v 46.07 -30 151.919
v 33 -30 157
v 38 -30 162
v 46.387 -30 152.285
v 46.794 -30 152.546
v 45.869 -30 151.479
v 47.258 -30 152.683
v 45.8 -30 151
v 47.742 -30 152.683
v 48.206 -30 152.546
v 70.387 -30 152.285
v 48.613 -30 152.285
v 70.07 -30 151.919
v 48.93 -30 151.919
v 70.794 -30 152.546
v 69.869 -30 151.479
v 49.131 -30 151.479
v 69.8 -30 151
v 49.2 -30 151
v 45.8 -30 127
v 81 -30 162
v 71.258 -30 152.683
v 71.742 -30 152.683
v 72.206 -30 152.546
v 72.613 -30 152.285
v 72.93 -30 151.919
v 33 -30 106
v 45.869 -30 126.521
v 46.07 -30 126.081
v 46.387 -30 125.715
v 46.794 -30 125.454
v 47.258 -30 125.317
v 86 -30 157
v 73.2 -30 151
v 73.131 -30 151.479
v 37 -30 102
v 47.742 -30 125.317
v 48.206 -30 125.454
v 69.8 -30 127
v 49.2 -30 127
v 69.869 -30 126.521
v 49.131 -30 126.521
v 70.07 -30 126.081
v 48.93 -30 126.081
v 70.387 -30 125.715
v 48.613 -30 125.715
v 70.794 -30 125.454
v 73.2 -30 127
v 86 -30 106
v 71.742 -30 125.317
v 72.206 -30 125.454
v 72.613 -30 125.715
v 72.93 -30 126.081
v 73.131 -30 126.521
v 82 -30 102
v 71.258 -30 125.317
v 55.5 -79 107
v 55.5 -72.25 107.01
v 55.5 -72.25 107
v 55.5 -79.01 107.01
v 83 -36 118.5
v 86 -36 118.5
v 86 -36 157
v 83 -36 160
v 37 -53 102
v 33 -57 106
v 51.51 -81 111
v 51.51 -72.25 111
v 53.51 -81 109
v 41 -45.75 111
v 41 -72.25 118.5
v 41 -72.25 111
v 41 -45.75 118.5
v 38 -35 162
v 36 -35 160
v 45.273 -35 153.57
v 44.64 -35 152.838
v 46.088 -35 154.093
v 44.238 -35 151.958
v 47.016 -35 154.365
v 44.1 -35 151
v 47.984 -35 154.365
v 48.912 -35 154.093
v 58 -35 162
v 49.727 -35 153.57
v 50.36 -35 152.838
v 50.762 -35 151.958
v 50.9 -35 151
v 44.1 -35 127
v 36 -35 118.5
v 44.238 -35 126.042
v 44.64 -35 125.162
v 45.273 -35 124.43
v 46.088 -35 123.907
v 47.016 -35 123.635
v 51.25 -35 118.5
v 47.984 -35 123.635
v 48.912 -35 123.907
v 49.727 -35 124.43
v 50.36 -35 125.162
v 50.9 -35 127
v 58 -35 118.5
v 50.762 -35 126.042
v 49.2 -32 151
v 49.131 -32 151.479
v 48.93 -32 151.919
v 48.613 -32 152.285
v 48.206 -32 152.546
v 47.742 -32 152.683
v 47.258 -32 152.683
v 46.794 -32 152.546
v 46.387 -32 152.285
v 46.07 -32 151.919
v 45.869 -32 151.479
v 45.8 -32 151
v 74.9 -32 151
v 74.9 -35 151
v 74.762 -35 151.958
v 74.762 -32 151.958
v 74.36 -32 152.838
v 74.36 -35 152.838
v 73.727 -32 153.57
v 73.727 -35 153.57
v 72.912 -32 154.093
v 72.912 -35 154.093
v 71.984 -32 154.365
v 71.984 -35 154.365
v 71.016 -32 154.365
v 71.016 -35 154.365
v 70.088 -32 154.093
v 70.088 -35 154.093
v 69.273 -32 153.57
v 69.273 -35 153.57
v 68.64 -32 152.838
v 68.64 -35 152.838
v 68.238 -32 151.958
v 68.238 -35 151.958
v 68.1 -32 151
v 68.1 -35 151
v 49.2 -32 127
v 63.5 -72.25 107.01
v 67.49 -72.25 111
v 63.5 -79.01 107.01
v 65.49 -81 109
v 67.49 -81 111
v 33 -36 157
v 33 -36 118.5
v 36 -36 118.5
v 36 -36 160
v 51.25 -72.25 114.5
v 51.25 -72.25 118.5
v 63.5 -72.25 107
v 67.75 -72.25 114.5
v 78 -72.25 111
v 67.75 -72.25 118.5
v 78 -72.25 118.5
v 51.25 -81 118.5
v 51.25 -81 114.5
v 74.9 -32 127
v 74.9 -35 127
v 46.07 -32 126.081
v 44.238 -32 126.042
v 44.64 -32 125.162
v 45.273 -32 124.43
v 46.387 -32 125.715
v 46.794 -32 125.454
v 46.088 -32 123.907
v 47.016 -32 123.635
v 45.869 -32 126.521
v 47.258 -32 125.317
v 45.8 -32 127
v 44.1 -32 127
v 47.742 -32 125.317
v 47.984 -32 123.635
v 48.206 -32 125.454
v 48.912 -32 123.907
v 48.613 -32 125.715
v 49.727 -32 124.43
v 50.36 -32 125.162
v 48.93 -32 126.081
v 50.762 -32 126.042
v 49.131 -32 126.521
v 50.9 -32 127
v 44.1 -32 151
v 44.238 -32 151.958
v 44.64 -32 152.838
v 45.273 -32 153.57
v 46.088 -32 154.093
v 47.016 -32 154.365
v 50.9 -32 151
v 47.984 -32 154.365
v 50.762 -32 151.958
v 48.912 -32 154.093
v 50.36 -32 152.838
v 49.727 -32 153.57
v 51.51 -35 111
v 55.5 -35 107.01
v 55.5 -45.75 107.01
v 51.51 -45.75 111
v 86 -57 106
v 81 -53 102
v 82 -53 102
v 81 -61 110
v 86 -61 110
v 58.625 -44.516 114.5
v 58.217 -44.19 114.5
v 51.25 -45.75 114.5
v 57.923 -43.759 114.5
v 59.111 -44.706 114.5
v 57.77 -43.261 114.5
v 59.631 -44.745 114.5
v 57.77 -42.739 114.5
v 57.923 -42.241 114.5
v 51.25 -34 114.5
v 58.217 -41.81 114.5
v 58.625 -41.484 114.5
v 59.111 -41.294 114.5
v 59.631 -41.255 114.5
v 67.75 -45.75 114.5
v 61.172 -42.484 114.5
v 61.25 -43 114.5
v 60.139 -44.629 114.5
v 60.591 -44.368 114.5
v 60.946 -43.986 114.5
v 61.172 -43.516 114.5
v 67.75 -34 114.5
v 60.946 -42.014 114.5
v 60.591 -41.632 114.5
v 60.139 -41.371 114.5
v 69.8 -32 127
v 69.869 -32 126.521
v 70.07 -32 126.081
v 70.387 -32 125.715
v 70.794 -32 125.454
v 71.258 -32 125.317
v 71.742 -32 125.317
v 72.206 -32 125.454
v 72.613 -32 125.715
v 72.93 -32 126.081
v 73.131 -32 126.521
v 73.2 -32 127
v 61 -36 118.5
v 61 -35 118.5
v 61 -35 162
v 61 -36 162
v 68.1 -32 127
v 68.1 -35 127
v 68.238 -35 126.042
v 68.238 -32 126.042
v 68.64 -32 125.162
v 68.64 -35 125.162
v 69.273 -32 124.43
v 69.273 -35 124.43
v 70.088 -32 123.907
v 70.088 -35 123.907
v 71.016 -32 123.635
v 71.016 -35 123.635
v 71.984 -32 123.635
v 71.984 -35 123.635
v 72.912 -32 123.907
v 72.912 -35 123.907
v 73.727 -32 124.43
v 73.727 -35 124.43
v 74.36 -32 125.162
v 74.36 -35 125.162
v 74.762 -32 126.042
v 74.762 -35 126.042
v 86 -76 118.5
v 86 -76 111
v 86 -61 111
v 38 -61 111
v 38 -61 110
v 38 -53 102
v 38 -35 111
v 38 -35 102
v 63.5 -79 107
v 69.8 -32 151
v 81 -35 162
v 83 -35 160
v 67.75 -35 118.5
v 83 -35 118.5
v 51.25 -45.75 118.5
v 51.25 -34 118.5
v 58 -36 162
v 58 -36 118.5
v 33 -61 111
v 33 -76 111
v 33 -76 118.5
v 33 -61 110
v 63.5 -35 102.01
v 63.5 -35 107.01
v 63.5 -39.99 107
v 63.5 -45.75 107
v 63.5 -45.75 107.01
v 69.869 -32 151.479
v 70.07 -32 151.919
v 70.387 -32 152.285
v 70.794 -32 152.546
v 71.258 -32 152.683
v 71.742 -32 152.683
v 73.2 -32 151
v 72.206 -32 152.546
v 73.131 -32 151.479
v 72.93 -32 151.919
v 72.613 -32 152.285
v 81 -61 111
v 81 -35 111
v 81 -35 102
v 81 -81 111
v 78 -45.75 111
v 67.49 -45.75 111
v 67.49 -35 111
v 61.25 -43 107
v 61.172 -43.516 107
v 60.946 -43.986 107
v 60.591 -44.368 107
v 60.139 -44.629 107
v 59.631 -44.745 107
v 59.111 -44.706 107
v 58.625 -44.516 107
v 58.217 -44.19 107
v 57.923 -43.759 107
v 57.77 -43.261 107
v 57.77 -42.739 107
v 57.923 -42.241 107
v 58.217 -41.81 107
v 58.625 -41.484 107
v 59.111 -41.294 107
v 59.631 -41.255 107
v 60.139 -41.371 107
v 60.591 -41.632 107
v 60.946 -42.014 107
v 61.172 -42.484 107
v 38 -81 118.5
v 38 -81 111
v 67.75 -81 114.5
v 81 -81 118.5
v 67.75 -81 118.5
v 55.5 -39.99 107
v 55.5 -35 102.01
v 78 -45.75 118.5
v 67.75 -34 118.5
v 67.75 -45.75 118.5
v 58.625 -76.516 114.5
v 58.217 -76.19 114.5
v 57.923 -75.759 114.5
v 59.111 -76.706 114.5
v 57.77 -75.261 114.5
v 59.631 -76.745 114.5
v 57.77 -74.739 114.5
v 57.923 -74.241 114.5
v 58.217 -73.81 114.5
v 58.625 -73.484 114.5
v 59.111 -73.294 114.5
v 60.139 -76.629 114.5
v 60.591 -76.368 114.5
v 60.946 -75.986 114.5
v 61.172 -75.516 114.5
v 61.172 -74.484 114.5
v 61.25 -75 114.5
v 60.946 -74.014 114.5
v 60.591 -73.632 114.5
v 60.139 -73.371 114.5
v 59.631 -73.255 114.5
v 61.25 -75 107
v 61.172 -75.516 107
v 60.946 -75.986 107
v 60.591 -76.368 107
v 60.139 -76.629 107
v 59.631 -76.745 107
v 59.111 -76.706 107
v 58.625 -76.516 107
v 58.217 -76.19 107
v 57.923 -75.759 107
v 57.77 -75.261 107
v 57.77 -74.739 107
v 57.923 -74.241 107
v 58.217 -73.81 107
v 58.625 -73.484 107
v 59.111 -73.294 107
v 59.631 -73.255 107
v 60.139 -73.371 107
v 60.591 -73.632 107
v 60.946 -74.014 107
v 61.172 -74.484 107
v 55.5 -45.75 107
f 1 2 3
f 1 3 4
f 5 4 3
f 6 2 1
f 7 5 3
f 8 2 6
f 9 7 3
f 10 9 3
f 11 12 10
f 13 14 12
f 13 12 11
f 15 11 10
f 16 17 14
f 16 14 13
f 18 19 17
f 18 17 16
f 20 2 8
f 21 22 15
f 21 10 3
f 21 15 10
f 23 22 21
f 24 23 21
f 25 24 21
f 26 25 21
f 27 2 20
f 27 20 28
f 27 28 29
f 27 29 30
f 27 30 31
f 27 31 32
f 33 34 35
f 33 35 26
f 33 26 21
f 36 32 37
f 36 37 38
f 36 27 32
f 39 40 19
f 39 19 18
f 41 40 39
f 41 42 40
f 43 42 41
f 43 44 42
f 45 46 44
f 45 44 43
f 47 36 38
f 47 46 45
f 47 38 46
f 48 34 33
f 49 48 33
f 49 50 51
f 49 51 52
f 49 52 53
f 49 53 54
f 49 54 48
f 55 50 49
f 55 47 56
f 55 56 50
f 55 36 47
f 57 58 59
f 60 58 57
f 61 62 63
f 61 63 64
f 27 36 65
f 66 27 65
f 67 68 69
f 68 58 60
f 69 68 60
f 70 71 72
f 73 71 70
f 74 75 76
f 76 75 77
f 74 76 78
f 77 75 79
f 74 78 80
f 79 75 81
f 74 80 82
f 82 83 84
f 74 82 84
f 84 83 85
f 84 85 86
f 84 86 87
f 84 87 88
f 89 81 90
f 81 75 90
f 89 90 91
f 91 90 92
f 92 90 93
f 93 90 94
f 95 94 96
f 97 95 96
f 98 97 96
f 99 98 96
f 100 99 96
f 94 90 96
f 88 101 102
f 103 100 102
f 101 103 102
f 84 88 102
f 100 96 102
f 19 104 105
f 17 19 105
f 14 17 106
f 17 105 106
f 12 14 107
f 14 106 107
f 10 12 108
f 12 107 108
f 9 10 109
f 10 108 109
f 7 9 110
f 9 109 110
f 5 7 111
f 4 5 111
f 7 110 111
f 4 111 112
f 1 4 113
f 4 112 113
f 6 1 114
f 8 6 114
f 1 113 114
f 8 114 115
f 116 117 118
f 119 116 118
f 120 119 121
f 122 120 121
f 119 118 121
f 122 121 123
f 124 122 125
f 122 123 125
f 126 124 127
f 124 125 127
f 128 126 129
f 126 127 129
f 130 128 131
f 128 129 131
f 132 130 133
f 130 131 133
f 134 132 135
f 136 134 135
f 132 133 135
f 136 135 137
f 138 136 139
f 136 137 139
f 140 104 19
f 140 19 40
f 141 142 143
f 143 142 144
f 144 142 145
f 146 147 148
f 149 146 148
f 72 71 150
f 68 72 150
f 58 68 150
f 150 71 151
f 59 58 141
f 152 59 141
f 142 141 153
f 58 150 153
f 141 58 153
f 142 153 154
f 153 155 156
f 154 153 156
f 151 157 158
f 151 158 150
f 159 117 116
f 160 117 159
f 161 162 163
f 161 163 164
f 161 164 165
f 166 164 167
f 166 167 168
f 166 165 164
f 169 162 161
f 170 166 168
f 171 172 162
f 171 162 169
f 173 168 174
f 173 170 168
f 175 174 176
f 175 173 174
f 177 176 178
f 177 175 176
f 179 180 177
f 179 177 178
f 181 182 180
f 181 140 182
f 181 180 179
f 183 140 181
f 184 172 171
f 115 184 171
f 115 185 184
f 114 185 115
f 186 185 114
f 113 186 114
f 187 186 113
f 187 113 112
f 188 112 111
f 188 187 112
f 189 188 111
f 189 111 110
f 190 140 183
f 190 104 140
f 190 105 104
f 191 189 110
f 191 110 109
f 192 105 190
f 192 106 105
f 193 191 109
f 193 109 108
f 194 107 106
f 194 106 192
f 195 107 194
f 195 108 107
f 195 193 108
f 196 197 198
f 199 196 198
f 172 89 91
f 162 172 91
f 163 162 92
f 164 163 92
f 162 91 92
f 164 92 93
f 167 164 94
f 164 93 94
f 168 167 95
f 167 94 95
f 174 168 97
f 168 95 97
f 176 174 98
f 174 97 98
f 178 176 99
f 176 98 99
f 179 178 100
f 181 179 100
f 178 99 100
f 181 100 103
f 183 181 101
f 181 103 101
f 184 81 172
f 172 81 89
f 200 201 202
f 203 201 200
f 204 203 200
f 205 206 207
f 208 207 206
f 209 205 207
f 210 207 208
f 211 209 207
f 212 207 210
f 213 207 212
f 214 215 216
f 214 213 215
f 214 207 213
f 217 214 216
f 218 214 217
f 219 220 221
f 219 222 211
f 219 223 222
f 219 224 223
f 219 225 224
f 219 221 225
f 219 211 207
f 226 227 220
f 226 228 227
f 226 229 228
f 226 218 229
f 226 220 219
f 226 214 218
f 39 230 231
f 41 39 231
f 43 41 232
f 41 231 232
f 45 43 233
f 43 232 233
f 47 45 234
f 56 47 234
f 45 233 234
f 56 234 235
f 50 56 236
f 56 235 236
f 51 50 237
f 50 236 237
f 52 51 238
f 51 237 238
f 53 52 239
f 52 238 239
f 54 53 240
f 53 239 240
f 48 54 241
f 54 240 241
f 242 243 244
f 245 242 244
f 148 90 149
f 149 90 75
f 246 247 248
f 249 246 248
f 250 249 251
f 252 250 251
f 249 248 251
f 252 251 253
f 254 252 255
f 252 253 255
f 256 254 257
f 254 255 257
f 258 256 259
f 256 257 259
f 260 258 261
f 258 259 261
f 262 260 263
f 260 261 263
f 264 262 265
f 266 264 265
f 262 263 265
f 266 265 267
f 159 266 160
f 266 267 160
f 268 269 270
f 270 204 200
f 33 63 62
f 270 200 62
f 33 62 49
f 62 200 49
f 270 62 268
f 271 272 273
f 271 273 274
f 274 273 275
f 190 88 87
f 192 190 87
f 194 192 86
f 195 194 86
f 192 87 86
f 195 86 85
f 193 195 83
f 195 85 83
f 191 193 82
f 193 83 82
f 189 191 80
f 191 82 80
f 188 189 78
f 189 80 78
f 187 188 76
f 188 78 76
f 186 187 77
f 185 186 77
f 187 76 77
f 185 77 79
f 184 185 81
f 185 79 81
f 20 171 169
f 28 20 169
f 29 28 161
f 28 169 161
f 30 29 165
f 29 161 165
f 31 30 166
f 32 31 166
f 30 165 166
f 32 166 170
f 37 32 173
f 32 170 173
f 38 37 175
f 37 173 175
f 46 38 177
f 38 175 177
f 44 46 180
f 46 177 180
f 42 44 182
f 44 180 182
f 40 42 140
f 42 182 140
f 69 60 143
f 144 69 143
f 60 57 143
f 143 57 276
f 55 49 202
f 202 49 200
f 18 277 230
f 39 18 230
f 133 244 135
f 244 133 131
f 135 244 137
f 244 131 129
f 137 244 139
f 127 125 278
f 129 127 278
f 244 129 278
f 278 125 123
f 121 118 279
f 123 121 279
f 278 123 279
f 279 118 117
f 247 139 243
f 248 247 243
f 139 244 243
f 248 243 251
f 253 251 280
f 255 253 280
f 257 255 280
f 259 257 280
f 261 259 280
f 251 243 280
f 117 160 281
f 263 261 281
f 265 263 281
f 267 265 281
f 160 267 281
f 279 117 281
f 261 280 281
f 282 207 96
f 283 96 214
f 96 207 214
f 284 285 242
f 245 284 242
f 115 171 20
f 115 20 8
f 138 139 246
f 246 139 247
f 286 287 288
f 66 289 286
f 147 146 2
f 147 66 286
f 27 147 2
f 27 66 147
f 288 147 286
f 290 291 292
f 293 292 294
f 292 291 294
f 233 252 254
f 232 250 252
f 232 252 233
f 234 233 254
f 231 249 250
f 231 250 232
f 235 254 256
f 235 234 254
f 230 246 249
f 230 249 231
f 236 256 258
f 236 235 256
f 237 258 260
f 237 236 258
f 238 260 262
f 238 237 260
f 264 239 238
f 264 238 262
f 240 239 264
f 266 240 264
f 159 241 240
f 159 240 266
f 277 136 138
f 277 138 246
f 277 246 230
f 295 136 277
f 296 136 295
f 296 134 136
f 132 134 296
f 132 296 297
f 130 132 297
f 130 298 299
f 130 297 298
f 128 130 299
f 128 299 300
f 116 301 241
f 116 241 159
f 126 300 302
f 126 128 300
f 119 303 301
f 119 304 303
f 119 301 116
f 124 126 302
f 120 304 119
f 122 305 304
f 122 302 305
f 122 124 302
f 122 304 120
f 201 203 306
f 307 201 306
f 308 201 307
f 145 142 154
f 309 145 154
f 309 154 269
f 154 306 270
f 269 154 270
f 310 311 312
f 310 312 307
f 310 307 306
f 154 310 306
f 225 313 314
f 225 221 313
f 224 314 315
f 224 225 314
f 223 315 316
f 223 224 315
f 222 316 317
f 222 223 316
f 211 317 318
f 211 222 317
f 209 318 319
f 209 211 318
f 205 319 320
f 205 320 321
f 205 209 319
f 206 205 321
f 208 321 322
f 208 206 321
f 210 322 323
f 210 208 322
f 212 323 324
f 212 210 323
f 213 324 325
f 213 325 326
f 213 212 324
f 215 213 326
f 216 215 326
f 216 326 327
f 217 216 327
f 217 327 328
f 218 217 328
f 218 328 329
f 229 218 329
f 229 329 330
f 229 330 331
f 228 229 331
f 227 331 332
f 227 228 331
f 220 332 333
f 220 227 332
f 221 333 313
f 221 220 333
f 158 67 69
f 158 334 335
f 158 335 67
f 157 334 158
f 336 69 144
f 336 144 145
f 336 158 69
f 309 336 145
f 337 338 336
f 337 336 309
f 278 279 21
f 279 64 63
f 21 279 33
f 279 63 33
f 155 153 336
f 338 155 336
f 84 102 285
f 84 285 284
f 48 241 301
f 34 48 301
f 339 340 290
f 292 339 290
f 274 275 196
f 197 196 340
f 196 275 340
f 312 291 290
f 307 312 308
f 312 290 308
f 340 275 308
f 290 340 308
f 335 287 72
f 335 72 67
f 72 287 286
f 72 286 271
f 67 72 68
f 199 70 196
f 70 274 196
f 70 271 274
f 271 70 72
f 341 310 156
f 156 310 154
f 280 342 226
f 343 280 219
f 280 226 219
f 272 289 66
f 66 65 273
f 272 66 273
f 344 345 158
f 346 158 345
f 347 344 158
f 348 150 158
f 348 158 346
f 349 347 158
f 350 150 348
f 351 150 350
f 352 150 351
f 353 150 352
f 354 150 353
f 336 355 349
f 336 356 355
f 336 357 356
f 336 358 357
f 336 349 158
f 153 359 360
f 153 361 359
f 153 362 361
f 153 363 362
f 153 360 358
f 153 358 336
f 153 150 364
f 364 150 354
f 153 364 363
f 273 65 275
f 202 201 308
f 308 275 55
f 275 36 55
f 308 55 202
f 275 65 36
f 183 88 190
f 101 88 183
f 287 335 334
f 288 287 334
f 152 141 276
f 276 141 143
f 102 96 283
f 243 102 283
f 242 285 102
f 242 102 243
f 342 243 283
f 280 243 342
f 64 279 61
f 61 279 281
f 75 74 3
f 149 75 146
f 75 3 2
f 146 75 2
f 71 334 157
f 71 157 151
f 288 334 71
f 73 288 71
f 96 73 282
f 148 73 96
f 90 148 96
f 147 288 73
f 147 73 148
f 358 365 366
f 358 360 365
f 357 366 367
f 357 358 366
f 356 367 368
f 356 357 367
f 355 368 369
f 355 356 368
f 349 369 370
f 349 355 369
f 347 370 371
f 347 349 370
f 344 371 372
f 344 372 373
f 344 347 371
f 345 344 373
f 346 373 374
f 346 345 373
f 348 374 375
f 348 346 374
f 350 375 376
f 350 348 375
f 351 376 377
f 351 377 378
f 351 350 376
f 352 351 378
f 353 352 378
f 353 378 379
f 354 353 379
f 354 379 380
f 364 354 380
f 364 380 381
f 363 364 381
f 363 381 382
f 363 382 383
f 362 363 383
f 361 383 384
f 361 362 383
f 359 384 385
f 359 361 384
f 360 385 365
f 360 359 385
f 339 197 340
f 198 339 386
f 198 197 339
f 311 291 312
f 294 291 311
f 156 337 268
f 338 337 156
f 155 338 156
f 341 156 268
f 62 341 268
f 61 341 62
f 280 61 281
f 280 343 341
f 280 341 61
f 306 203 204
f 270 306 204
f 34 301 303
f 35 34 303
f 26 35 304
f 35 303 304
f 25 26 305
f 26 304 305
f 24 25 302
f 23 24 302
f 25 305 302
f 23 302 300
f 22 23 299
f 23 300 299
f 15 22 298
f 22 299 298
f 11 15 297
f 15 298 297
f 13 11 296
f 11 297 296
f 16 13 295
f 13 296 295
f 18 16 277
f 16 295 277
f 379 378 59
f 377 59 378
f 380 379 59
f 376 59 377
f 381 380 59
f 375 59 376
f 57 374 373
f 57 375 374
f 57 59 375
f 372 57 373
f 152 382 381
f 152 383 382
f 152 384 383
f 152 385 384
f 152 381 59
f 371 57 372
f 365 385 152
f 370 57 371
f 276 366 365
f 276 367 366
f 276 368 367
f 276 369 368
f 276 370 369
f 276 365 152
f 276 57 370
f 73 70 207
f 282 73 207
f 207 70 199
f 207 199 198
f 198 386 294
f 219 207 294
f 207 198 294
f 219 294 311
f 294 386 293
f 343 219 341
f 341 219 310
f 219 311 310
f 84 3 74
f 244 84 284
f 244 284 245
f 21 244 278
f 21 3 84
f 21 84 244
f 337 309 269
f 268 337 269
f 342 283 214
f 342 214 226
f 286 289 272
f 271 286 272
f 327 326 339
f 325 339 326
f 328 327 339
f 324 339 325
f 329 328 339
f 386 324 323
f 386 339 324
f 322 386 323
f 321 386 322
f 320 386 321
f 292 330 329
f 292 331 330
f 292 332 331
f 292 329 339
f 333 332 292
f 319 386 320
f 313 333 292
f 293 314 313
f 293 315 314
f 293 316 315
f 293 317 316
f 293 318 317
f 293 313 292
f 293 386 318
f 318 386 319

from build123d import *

# Parameters (mm, degrees)
EXTRUDE002_DEPTH = 2.5
BOX001_W         = 53
BOX001_H         = 46
BOX001_DEPTH     = 5
BOX002_W         = 5
BOX002_H         = 30
BOX002_DEPTH     = 12
BOX003_W         = 5
BOX003_H         = 30
BOX003_DEPTH     = 12
BOX_W            = 53
BOX_H            = 5
BOX_DEPTH        = 60
SKETCH028_R      = 1.75
SKETCH028_R_2    = 13.25
POCKET001_DEPTH  = 5
CHAMFER_SIZE     = 8
CHAMFER001_SIZE  = 4
SKETCH029_W      = 16.5
SKETCH029_H      = 46
POCKET002_DEPTH  = 1.5
CHAMFER002_SIZE  = 5
CHAMFER003_SIZE  = 5
POCKET003_DEPTH  = 5
POCKET004_DEPTH  = 3
SKETCH032_W      = 37
SKETCH032_H      = 26.5
POCKET005_DEPTH  = 5
SKETCH033_W      = 3
SKETCH033_H      = 47.5
PAD003_DEPTH     = 1
SKETCH034_W      = 8
SKETCH034_H      = 8.75
SKETCH034_R      = 1.75
SKETCH034_H_2    = 10.75
PAD004_DEPTH     = 4
SKETCH035_W      = 16.5
SKETCH035_H      = 4
POCKET006_DEPTH  = 2
CHAMFER004_SIZE  = 4.99
CHAMFER005_SIZE  = 3.99
CHAMFER006_SIZE  = 2


with BuildPart() as extrude002:
    # Facebinder → Extrude002 (new body)
    with BuildSketch(Plane(origin=(40.336531, -57.03076, 116), x_dir=(0, 1, 0), z_dir=(0, 0, 1))):
        Polygon((-18.96924, 7.336531), (-23.96924, 2.336531), (-23.96924, -10.913469), (-15.21924, -10.913469), (-15.21924, -0.663469), (11.28076, -0.663469), (11.28076, -10.913469), (22.03076, -10.913469), (22.03076, 7.336531), align=None)
        Polygon((-23.96924, -40.663469), (-18.96924, -45.663469), (22.03076, -45.663469), (22.03076, -27.413469), (11.28076, -27.413469), (11.28076, -37.663469), (-15.21924, -37.663469), (-15.21924, -27.413469), (-23.96924, -27.413469), align=None)
    extrude(amount=EXTRUDE002_DEPTH)


with BuildPart() as box001:
    # Box001 → Box001 (new body)
    with BuildSketch(Plane(origin=(33, -76, 111), x_dir=(1, 0, 0), z_dir=(0, 0, 1))):
        with Locations((26.5, 23)):
            Rectangle(BOX001_W, BOX001_H)
    extrude(amount=BOX001_DEPTH)


with BuildPart() as box002:
    # Box002 → Box002 (new body)
    with BuildSketch(Plane(origin=(81, -56, 102), x_dir=(1, 0, 0), z_dir=(0, 0, 1))):
        with Locations((2.5, 15)):
            Rectangle(BOX002_W, BOX002_H)
    extrude(amount=BOX002_DEPTH)


with BuildPart() as box003:
    # Box003 → Box003 (new body)
    with BuildSketch(Plane(origin=(33, -56, 102), x_dir=(1, 0, 0), z_dir=(0, 0, 1))):
        with Locations((2.5, 15)):
            Rectangle(BOX003_W, BOX003_H)
    extrude(amount=BOX003_DEPTH)


with BuildPart() as chamfer006:
    # Box → Box (new body)
    with BuildSketch(Plane(origin=(33, -30, 102), x_dir=(1, 0, 0), z_dir=(0, 0, 1))):
        with Locations((26.5, 2.5)):
            Rectangle(BOX_W, BOX_H)
    extrude(amount=BOX_DEPTH)

    # Fusion001: union Box001, Box002, Box003
    add(box001.part)
    add(box002.part)
    add(box003.part)


with BuildPart() as chamfer006_1:
    # Fusion001 placement: moved
    add(chamfer006.part.moved(Location((0, -5, 0))))

    # Sketch028 → Pocket001 (cut)
    with BuildSketch(Plane(origin=(0, -5, 116), x_dir=(1, 0, 0), z_dir=(0, 0, 1))):
        with Locations((59.5, -70)):
            Circle(SKETCH028_R)
        with Locations((59.5, -38)):
            Circle(SKETCH028_R)
        with Locations((59.5, -54)):
            Circle(SKETCH028_R_2)
    extrude(amount=-POCKET001_DEPTH, mode=Mode.SUBTRACT)

    # Chamfer
    chamfer_edges = [chamfer006_1.edges().sort_by_distance(p)[0] for p in [
        (83.5, -61, 102),
        (35.5, -61, 102),
    ]]
    chamfer(chamfer_edges, length=CHAMFER_SIZE)

    # Chamfer001
    chamfer001_edges = [chamfer006_1.edges().sort_by_distance(p)[0] for p in [
        (86, -41.5, 102),
        (33, -41.5, 102),
    ]]
    chamfer(chamfer001_edges, length=CHAMFER001_SIZE)

    # Sketch029 → Pocket002 (cut)
    with BuildSketch(Plane(origin=(0, -5, 116), x_dir=(1, 0, 0), z_dir=(0, 0, 1))):
        with Locations((59.5, -53)):
            Rectangle(SKETCH029_W, SKETCH029_H)
    extrude(amount=-POCKET002_DEPTH, mode=Mode.SUBTRACT)

    # Chamfer002
    chamfer002_edges = [chamfer006_1.edges().sort_by_distance(p)[0] for p in [
        (86, -81, 113.5),
        (33, -81, 113.5),
    ]]
    chamfer(chamfer002_edges, length=CHAMFER002_SIZE)

    # Chamfer003
    chamfer003_edges = [chamfer006_1.edges().sort_by_distance(p)[0] for p in [
        (86, -32.5, 162),
        (33, -32.5, 162),
    ]]
    chamfer(chamfer003_edges, length=CHAMFER003_SIZE)

    # Sketch030 → Pocket003 (cut)
    with BuildSketch(Plane.XZ.offset(35)):
        with BuildLine():
            Line((49.2, 151), (49.2, 127))
            ThreePointArc((45.8, 127), (47.5, 125.3), (49.2, 127))
            Line((45.8, 127), (45.8, 151.000018))
            ThreePointArc((49.2, 151), (47.500009, 152.7), (45.8, 151.000018))
        make_face()
        with BuildLine():
            Line((69.8, 151), (69.8, 127))
            ThreePointArc((69.8, 127), (71.5, 125.3), (73.2, 127))
            Line((73.2, 127), (73.2, 151))
            ThreePointArc((73.2, 151), (71.5, 152.7), (69.8, 151))
        make_face()
    extrude(amount=-POCKET003_DEPTH, mode=Mode.SUBTRACT)

    # Sketch031 → Pocket004 (cut)
    with BuildSketch(Plane.XZ.offset(35)):
        with BuildLine():
            ThreePointArc((50.9, 151), (47.5, 154.4), (44.1, 151))
            Line((44.1, 151), (44.1, 127))
            ThreePointArc((44.1, 127), (47.5, 123.6), (50.9, 127))
            Line((50.9, 151), (50.9, 127))
        make_face()
        with BuildLine():
            ThreePointArc((74.9, 151), (71.5, 154.4), (68.1, 151))
            Line((68.1, 151), (68.1, 127))
            ThreePointArc((68.1, 127), (71.5, 123.6), (74.9, 127))
            Line((74.9, 151), (74.9, 127))
        make_face()
    extrude(amount=-POCKET004_DEPTH, mode=Mode.SUBTRACT)

    # Sketch032 → Pocket005 (cut)
    with BuildSketch(Plane(origin=(0, -5, 116), x_dir=(1, 0, 0), z_dir=(0, 0, 1))):
        with Locations((59.5, -54)):
            Rectangle(SKETCH032_W, SKETCH032_H)
    extrude(amount=-POCKET005_DEPTH, mode=Mode.SUBTRACT)

    # Fusion002: union Extrude002
    add(extrude002.part)

    # Sketch033 → Pad003 (new body)
    with BuildSketch(Plane.XZ.offset(35)):
        Polygon((33, 118.5), (36, 118.5), (36, 156.631975), (36, 160), (33, 157), align=None)
        Polygon((86, 118.5), (83, 118.5), (83, 156.631975), (83, 160), (86, 157), align=None)
        with Locations((59.5, 138.25)):
            Rectangle(SKETCH033_W, SKETCH033_H)
    extrude(amount=PAD003_DEPTH)

    # Sketch034 → Pad004 (new body)
    with BuildSketch(Plane(origin=(0, 0, 111), x_dir=(1, 0, 0), z_dir=(0, 0, -1))):
        with Locations((59.5, 76.625)):
            Rectangle(SKETCH034_W, SKETCH034_H)
        with Locations((59.5, 75)):
            Circle(SKETCH034_R, mode=Mode.SUBTRACT)
        with Locations((59.5, 40.375)):
            Rectangle(SKETCH034_W, SKETCH034_H_2)
        with Locations((59.5, 43)):
            Circle(SKETCH034_R, mode=Mode.SUBTRACT)
    extrude(amount=PAD004_DEPTH)

    # Sketch035 → Pocket006 (cut)
    with BuildSketch(Plane.XZ.offset(36)):
        with Locations((59.5, 116.5)):
            Rectangle(SKETCH035_W, SKETCH035_H)
    extrude(amount=-POCKET006_DEPTH, mode=Mode.SUBTRACT)

    # Chamfer004
    chamfer004_edges = [chamfer006_1.edges().sort_by_distance(p)[0] for p in [
        (59.5, -35, 107),
    ]]
    chamfer(chamfer004_edges, length=CHAMFER004_SIZE)

    # Chamfer005
    chamfer005_edges = [chamfer006_1.edges().sort_by_distance(p)[0] for p in [
        (63.5, -76.625, 111),
        (63.5, -40.375, 111),
        (55.5, -40.375, 111),
        (55.5, -76.625, 111),
    ]]
    chamfer(chamfer005_edges, length=CHAMFER005_SIZE)

    # Chamfer006
    chamfer006_edges = [chamfer006_1.edges().sort_by_distance(p)[0] for p in [
        (59.5, -81, 107),
    ]]
    chamfer(chamfer006_edges, length=CHAMFER006_SIZE)


solid = chamfer006_1.part
